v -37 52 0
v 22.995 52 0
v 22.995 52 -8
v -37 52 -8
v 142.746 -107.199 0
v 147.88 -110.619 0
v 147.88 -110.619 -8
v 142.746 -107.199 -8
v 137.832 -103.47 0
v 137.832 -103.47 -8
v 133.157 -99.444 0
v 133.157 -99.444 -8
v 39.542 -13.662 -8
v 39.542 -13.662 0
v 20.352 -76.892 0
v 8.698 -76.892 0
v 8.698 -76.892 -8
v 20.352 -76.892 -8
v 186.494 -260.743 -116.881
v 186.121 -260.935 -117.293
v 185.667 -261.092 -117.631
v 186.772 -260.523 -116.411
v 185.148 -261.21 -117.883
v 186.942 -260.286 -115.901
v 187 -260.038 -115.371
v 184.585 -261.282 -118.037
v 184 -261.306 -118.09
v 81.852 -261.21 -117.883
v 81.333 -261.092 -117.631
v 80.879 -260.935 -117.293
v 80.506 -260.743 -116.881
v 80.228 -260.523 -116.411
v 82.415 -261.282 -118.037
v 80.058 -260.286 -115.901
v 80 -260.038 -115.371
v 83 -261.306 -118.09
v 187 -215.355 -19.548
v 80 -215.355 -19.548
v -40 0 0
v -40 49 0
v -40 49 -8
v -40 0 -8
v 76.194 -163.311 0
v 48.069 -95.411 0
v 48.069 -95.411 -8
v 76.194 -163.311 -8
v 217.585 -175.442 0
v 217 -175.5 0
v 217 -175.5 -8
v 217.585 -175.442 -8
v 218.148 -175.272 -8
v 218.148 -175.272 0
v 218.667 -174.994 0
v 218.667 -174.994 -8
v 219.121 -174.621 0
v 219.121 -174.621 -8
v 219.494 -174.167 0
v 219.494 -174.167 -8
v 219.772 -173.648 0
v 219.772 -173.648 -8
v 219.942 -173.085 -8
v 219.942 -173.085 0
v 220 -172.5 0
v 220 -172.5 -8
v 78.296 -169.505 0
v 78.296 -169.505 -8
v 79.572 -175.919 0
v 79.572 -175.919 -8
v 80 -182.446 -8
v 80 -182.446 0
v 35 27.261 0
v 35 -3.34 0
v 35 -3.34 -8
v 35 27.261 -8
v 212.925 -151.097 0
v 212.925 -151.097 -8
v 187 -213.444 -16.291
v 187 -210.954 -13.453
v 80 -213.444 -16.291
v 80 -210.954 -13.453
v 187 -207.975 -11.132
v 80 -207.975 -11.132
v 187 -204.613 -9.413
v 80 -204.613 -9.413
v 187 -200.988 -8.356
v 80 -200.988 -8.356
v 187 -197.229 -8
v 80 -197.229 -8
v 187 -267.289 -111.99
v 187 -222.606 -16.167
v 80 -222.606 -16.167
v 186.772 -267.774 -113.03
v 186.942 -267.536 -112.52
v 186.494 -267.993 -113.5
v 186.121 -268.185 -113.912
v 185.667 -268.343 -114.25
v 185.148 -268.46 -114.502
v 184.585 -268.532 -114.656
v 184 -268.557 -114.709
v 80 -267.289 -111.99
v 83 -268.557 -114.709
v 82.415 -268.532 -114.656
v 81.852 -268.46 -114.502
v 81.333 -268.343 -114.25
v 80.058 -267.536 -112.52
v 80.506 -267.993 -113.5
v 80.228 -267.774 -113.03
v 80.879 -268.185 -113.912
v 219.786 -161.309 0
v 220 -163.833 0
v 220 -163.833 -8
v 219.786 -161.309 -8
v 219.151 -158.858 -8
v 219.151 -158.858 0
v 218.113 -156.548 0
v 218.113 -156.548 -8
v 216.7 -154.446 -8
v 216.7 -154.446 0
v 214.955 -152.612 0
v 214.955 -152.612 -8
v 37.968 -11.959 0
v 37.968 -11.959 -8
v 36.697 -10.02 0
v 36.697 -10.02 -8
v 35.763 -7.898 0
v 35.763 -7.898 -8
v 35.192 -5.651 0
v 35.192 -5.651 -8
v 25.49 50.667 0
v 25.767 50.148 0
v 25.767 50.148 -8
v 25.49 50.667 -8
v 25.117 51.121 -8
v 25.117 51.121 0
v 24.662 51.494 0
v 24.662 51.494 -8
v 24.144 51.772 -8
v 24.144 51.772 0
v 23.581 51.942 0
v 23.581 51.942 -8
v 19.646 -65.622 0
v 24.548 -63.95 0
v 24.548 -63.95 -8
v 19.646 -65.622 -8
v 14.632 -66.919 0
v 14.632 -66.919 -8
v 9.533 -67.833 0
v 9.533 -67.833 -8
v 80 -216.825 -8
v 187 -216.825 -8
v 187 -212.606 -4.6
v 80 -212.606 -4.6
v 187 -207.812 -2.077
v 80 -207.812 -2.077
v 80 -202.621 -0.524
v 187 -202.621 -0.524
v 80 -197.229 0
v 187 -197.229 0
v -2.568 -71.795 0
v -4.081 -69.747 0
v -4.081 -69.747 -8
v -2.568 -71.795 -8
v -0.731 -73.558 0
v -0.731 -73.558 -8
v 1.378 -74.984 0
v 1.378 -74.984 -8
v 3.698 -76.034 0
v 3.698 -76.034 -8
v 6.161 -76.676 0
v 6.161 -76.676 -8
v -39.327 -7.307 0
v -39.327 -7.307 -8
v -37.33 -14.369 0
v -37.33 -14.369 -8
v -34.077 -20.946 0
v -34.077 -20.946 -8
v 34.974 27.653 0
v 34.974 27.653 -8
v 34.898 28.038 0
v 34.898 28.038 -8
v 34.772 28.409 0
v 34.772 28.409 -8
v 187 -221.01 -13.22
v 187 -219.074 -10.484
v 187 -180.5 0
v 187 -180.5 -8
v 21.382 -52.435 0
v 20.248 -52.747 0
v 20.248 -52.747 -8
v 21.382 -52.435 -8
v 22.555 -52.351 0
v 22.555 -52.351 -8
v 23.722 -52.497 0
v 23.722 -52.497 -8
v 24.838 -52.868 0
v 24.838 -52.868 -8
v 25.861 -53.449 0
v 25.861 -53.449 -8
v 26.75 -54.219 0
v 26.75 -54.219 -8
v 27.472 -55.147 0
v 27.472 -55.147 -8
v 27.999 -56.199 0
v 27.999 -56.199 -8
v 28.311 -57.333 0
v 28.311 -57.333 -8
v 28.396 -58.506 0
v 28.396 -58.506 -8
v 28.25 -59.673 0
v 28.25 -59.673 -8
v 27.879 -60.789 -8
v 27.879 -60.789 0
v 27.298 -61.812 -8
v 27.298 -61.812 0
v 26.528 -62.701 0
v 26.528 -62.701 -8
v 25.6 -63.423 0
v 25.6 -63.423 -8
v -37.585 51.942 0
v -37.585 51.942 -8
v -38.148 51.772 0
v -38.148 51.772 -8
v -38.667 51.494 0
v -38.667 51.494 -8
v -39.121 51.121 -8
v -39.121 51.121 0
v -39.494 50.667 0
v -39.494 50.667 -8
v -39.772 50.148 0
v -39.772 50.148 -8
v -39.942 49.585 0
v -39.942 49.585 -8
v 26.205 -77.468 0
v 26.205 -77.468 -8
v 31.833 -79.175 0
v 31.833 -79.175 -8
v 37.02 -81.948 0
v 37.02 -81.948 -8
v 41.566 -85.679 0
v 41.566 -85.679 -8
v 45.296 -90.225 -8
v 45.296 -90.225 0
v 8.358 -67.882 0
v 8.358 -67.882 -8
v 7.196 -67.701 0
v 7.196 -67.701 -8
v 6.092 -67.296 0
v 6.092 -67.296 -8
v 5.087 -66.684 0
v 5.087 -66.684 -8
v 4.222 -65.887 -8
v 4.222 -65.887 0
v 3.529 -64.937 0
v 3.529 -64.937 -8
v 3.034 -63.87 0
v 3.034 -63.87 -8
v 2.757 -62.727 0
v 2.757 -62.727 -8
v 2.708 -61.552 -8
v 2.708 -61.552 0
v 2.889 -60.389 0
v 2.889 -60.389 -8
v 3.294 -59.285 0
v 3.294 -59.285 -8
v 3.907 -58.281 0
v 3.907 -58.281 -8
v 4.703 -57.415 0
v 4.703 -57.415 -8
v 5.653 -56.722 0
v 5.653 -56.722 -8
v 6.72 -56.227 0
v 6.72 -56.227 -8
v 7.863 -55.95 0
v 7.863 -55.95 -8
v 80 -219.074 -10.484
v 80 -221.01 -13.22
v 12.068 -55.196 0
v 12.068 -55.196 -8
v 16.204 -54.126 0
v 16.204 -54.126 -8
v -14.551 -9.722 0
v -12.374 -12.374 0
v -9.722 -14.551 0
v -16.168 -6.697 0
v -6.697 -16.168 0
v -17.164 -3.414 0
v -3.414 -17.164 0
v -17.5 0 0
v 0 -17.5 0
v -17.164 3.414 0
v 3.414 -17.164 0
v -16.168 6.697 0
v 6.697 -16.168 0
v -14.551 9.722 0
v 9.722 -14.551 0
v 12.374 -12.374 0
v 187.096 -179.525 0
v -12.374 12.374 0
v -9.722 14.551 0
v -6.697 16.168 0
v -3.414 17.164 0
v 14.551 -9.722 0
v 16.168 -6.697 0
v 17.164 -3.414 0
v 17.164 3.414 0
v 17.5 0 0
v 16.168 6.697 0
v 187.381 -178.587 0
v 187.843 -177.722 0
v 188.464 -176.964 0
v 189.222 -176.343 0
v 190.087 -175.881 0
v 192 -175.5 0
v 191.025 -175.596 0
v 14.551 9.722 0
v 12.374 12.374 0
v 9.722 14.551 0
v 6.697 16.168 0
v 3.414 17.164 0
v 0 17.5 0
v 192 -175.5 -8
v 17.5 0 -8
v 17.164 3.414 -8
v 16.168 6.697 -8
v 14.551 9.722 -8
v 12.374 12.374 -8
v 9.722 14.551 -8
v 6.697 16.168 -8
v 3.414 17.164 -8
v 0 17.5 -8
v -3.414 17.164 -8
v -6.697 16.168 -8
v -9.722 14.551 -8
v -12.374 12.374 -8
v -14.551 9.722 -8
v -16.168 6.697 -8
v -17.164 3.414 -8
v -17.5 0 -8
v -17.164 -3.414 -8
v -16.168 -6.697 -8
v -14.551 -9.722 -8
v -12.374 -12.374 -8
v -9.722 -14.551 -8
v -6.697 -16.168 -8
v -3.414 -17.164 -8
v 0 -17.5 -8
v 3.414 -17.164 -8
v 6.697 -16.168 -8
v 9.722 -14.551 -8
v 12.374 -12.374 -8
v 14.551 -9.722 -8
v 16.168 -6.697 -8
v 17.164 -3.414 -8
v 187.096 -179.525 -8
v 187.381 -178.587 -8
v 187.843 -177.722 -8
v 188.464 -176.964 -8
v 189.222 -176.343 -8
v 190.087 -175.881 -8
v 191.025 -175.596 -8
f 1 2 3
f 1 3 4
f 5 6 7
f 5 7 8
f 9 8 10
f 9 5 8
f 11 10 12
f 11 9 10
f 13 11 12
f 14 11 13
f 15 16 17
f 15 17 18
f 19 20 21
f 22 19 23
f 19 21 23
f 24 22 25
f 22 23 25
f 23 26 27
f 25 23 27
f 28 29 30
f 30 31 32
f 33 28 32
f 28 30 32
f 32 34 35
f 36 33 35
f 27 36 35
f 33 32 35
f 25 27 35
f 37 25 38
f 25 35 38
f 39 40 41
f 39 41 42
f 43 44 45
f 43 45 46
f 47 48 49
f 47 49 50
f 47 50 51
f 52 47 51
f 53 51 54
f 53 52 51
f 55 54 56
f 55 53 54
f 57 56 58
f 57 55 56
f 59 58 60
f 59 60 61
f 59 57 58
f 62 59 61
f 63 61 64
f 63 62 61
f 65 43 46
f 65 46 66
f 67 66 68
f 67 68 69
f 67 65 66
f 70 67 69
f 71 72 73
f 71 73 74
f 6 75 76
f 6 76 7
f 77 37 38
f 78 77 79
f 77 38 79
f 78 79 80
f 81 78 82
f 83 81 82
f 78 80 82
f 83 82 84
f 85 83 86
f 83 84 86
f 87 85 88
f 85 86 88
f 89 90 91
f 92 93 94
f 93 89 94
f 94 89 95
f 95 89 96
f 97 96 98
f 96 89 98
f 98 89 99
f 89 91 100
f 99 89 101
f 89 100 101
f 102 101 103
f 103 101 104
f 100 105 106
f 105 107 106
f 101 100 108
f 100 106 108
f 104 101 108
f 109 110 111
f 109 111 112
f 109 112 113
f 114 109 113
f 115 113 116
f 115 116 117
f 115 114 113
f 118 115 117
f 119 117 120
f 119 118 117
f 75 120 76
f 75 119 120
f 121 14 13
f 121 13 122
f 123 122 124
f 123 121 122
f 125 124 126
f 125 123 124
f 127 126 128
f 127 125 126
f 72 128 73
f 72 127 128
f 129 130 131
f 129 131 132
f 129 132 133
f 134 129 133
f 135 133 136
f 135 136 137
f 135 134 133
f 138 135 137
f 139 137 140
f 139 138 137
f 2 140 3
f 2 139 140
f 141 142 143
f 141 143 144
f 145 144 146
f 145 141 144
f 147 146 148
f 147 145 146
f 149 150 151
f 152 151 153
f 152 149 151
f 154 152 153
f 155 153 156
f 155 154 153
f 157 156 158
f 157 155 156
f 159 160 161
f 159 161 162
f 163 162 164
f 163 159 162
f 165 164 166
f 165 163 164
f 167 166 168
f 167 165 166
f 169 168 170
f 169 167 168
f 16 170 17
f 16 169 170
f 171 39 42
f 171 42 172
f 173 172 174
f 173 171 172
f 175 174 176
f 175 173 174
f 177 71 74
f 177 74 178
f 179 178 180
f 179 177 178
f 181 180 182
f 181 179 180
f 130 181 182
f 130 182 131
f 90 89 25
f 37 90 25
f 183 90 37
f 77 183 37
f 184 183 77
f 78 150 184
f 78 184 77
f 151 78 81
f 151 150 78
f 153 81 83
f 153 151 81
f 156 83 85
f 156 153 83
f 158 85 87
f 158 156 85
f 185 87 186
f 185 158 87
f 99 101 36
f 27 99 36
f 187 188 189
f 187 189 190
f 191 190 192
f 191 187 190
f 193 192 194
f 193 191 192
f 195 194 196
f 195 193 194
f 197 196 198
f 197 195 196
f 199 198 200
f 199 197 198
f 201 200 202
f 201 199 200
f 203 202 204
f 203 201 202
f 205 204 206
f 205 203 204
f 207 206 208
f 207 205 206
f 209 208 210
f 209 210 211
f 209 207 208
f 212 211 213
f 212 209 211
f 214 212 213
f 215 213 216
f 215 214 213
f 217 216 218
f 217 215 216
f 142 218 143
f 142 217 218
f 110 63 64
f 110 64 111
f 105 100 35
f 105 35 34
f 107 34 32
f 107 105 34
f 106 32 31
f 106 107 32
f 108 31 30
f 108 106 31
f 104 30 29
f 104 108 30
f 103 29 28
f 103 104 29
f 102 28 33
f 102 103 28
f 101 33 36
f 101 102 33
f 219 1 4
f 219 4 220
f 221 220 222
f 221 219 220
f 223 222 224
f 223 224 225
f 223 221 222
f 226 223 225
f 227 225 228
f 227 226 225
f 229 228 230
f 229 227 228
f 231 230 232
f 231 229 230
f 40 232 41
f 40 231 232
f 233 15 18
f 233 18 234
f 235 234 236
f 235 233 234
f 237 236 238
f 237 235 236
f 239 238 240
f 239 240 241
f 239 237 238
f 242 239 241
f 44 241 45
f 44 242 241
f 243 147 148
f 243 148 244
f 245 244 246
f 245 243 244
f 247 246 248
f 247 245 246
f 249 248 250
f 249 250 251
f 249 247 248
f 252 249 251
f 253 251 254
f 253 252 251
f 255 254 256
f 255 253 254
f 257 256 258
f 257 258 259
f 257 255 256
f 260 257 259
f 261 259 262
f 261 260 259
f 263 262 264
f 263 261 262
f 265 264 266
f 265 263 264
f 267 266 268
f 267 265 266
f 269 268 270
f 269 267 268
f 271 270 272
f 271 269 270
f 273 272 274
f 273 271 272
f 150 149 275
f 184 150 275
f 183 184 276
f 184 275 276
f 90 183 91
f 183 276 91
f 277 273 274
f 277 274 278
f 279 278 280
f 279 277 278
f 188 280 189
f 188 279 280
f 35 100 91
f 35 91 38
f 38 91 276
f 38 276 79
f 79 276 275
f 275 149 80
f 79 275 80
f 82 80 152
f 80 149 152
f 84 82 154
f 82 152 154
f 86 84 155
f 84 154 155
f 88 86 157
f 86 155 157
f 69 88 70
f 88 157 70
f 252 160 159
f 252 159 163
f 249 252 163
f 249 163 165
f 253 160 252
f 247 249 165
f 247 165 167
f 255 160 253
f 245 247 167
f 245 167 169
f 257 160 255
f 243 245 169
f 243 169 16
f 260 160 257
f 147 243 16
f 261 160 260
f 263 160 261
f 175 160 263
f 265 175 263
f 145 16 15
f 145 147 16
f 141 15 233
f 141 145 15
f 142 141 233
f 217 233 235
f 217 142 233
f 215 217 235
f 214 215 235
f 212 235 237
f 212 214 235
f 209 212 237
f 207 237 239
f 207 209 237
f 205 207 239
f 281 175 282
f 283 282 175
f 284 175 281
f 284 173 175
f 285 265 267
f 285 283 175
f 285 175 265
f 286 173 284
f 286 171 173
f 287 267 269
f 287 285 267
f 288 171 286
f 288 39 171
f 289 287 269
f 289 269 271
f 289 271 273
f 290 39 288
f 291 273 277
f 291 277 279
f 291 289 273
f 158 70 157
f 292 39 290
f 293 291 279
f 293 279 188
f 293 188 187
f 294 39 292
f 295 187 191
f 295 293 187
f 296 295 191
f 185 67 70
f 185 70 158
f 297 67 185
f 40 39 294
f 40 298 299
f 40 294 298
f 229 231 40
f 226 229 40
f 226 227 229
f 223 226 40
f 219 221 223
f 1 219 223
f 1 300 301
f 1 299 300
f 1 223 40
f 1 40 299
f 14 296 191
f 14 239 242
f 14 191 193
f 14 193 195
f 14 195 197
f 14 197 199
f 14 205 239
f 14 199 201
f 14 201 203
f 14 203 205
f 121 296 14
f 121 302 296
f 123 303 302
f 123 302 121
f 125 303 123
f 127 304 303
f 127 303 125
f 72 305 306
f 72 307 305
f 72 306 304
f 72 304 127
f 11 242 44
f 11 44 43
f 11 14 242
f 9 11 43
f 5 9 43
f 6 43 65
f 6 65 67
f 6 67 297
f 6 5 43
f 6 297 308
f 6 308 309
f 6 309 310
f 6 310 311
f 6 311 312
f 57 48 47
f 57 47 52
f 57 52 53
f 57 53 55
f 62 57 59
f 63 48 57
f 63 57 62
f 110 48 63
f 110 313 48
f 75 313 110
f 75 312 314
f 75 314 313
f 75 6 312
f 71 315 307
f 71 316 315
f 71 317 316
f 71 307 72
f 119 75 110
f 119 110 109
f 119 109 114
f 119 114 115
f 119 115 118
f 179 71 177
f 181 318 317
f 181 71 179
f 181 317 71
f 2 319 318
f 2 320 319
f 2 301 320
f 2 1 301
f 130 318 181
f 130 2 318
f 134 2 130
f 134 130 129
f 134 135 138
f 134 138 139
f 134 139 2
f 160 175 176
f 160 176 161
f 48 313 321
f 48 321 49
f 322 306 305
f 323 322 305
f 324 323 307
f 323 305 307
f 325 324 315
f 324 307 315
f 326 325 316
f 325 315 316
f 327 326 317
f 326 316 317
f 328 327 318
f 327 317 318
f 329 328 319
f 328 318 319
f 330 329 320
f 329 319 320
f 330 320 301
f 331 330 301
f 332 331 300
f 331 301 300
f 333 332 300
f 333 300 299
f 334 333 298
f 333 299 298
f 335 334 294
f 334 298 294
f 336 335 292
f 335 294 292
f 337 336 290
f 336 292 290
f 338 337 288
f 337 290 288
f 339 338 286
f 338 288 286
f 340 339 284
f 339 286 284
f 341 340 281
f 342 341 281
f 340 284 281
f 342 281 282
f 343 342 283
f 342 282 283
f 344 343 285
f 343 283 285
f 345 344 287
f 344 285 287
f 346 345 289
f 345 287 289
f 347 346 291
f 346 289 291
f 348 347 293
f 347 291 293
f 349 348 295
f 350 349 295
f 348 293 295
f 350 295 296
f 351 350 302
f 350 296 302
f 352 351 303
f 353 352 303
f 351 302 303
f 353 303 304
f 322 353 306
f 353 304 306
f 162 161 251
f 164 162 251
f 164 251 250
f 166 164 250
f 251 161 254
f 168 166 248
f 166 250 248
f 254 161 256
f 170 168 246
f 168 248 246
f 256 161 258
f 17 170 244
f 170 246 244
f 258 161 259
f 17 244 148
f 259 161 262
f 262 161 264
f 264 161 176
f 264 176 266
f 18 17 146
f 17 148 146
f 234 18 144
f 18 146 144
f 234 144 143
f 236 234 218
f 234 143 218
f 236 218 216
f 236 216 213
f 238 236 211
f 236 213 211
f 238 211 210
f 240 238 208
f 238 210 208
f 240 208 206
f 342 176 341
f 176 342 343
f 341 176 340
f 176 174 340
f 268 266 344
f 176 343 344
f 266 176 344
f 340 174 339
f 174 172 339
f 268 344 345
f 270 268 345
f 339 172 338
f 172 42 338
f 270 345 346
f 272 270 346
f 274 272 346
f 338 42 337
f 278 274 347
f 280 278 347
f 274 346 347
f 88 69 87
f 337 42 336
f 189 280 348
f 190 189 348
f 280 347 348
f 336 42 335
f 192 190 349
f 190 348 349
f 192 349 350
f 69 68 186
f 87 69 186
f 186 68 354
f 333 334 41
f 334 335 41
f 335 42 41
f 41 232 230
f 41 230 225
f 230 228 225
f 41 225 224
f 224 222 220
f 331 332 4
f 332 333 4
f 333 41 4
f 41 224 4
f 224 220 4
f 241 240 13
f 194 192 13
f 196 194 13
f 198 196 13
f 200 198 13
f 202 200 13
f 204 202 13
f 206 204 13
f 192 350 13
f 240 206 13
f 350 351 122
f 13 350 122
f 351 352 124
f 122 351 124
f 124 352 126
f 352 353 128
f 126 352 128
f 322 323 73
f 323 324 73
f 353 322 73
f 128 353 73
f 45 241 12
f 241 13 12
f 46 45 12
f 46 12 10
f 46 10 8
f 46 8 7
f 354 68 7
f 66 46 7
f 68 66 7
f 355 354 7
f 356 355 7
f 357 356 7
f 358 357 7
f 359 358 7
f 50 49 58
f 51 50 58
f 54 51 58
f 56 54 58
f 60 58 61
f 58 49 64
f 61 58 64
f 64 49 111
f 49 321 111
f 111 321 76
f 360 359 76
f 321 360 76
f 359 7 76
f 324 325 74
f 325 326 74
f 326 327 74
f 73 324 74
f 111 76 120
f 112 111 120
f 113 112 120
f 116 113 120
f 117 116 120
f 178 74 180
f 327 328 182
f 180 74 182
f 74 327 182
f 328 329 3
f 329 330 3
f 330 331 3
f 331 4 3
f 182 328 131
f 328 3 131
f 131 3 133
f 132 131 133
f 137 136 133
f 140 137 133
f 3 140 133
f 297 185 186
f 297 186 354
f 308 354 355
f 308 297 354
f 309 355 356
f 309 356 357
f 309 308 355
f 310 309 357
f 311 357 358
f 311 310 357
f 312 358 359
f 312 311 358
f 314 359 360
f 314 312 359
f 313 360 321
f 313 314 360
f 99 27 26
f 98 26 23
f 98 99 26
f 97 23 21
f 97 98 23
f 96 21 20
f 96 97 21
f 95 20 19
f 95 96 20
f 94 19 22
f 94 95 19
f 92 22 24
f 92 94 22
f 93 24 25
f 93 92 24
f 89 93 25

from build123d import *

# Parameters (mm, degrees)
SKETCH1_R              = 17.5
BASE_EXTRUDE_DEPTH     = 8
PROCESS_BENDS1_START   = 80
PROCESS_BENDS1_DEPTH   = 107
PROCESS_BENDS1_2_DEPTH = 107
PROCESS_BENDS1_START_2 = -196
PROCESS_BENDS1_3_DEPTH = 34.029061455


with BuildPart() as part:
    # Sketch1 → Base-Extrude (new body)
    with BuildSketch(Plane.XY):
        with BuildLine():
            Line((83, -332.5), (184, -332.5))
            ThreePointArc((184, -332.5), (186.121320344, -331.621320344), (187, -329.5))
            Line((187, -329.5), (187, -180.5))
            ThreePointArc((187, -180.5), (188.464466094, -176.964466094), (192, -175.5))
            Line((192, -175.5), (217, -175.5))
            ThreePointArc((217, -175.5), (219.121320344, -174.621320344), (220, -172.5))
            Line((220, -172.5), (220, -163.832674563))
            ThreePointArc((220, -163.832674563), (218.112603612, -156.548470658), (212.925383131, -151.097357439))
            Line((212.925383131, -151.097357439), (147.880138289, -110.618704164))
            ThreePointArc((147.880138289, -110.618704164), (140.259841851, -105.372411008), (133.157005065, -99.444323689))
            Line((133.157005065, -99.444323689), (39.541737093, -13.661735283))
            ThreePointArc((39.541737093, -13.661735283), (36.185639292, -8.978306226), (35, -3.339852568))
            Line((35, -3.339852568), (35, 27.261127274))
            ThreePointArc((35, 27.261127274), (34.942355841, 27.84639824), (34.771638598, 28.409177571))
            Line((34.771638598, 28.409177571), (25.767102684, 50.148050297))
            ThreePointArc((25.767102684, 50.148050297), (24.662174785, 51.494408837), (22.995464086, 52))
            Line((22.995464086, 52), (-37, 52))
            ThreePointArc((-37, 52), (-39.121320344, 51.121320344), (-40, 49))
            Line((-40, 49), (-40, 0))
            ThreePointArc((-40, 0), (-38.490793042, -10.883880327), (-34.077057451, -20.946459259))
            Line((-34.077057451, -20.946459259), (-4.080577734, -69.746676518))
            ThreePointArc((-4.080577734, -69.746676518), (1.377930614, -74.984191681), (8.69831881, -76.891754296))
            Line((8.69831881, -76.891754296), (20.352408817, -76.891754296))
            ThreePointArc((20.352408817, -76.891754296), (37.019515808, -81.947665927), (48.068794793, -95.411251325))
            Line((48.068794793, -95.411251325), (76.193976626, -163.311446751))
            ThreePointArc((76.193976626, -163.311446751), (79.03926402, -172.691102268), (80, -182.445618369))
            Line((80, -182.445618369), (80, -329.5))
            ThreePointArc((80, -329.5), (80.878679656, -331.621320344), (83, -332.5))
        make_face()
        Circle(SKETCH1_R, mode=Mode.SUBTRACT)
        with BuildLine():
            ThreePointArc((7.863280204, -55.950145884), (14.146470229, -54.700341681), (20.247789149, -52.747294097))
            ThreePointArc((20.247789149, -52.747294097), (27.999479406, -56.198568959), (24.548204544, -63.950259215))
            ThreePointArc((24.548204544, -63.950259215), (17.151030278, -66.318113366), (9.533357416, -67.833362709))
            ThreePointArc((9.533357416, -67.833362709), (2.756710398, -62.726792902), (7.863280204, -55.950145884))
        make_face(mode=Mode.SUBTRACT)
    extrude(amount=-BASE_EXTRUDE_DEPTH)

    # Process-Bends1: read off the stored shape, not the designer's step
    # Process-Bends1 outline → Process-Bends1 (cut)
    with BuildSketch(Plane.YZ.offset(PROCESS_BENDS1_START)):
        with BuildLine():
            Line((-332.5, -8), (-216.824957909, -8))
            ThreePointArc((-216.824957909, -8), (-207.812045211, -2.077037206), (-197.229039967, 0))
            Line((-197.229039967, 0), (-332.5, 0))
            Line((-332.5, 0), (-332.5, -8))
        make_face()
    extrude(amount=PROCESS_BENDS1_DEPTH, mode=Mode.SUBTRACT)

    # Process-Bends1 2 outline → Process-Bends1 2 (add)
    with BuildSketch(Plane.YZ.offset(PROCESS_BENDS1_START)):
        with BuildLine():
            Line((-268.556535875, -114.70866427), (-261.306073579, -118.089610364))
            Line((-261.306073579, -118.089610364), (-215.355195707, -19.547634765))
            ThreePointArc((-215.355195707, -19.547634765), (-207.975032134, -11.132171084), (-197.229039967, -8))
            Line((-197.229039967, -8), (-216.824957909, -8))
            ThreePointArc((-216.824957909, -8), (-220.083053817, -11.823039502), (-222.605658004, -16.166688671))
            Line((-222.605658004, -16.166688671), (-268.556535875, -114.70866427))
        make_face()
    extrude(amount=PROCESS_BENDS1_2_DEPTH)

    # Process-Bends1 3 outline → Process-Bends1 3 (cut)
    with BuildSketch(Plane(origin=(0, 0, 0), x_dir=(1, 0, 0), z_dir=(0, 0.9063077870366512, -0.42261826174069705)).offset(PROCESS_BENDS1_START_2)):
        with BuildLine():
            Line((187, 217.458252039), (184, 217.458252039))
            ThreePointArc((184, 217.458252039), (186.121320344, 216.579572383), (187, 214.458252039))
            Line((187, 214.458252039), (187, 217.458252039))
        make_face()
        with BuildLine():
            ThreePointArc((80, 214.458252039), (80.878679656, 216.579572383), (83, 217.458252039))
            Line((83, 217.458252039), (80, 217.458252039))
            Line((80, 217.458252039), (80, 214.458252039))
        make_face()
    extrude(amount=PROCESS_BENDS1_3_DEPTH, mode=Mode.SUBTRACT)


solid = part.part
